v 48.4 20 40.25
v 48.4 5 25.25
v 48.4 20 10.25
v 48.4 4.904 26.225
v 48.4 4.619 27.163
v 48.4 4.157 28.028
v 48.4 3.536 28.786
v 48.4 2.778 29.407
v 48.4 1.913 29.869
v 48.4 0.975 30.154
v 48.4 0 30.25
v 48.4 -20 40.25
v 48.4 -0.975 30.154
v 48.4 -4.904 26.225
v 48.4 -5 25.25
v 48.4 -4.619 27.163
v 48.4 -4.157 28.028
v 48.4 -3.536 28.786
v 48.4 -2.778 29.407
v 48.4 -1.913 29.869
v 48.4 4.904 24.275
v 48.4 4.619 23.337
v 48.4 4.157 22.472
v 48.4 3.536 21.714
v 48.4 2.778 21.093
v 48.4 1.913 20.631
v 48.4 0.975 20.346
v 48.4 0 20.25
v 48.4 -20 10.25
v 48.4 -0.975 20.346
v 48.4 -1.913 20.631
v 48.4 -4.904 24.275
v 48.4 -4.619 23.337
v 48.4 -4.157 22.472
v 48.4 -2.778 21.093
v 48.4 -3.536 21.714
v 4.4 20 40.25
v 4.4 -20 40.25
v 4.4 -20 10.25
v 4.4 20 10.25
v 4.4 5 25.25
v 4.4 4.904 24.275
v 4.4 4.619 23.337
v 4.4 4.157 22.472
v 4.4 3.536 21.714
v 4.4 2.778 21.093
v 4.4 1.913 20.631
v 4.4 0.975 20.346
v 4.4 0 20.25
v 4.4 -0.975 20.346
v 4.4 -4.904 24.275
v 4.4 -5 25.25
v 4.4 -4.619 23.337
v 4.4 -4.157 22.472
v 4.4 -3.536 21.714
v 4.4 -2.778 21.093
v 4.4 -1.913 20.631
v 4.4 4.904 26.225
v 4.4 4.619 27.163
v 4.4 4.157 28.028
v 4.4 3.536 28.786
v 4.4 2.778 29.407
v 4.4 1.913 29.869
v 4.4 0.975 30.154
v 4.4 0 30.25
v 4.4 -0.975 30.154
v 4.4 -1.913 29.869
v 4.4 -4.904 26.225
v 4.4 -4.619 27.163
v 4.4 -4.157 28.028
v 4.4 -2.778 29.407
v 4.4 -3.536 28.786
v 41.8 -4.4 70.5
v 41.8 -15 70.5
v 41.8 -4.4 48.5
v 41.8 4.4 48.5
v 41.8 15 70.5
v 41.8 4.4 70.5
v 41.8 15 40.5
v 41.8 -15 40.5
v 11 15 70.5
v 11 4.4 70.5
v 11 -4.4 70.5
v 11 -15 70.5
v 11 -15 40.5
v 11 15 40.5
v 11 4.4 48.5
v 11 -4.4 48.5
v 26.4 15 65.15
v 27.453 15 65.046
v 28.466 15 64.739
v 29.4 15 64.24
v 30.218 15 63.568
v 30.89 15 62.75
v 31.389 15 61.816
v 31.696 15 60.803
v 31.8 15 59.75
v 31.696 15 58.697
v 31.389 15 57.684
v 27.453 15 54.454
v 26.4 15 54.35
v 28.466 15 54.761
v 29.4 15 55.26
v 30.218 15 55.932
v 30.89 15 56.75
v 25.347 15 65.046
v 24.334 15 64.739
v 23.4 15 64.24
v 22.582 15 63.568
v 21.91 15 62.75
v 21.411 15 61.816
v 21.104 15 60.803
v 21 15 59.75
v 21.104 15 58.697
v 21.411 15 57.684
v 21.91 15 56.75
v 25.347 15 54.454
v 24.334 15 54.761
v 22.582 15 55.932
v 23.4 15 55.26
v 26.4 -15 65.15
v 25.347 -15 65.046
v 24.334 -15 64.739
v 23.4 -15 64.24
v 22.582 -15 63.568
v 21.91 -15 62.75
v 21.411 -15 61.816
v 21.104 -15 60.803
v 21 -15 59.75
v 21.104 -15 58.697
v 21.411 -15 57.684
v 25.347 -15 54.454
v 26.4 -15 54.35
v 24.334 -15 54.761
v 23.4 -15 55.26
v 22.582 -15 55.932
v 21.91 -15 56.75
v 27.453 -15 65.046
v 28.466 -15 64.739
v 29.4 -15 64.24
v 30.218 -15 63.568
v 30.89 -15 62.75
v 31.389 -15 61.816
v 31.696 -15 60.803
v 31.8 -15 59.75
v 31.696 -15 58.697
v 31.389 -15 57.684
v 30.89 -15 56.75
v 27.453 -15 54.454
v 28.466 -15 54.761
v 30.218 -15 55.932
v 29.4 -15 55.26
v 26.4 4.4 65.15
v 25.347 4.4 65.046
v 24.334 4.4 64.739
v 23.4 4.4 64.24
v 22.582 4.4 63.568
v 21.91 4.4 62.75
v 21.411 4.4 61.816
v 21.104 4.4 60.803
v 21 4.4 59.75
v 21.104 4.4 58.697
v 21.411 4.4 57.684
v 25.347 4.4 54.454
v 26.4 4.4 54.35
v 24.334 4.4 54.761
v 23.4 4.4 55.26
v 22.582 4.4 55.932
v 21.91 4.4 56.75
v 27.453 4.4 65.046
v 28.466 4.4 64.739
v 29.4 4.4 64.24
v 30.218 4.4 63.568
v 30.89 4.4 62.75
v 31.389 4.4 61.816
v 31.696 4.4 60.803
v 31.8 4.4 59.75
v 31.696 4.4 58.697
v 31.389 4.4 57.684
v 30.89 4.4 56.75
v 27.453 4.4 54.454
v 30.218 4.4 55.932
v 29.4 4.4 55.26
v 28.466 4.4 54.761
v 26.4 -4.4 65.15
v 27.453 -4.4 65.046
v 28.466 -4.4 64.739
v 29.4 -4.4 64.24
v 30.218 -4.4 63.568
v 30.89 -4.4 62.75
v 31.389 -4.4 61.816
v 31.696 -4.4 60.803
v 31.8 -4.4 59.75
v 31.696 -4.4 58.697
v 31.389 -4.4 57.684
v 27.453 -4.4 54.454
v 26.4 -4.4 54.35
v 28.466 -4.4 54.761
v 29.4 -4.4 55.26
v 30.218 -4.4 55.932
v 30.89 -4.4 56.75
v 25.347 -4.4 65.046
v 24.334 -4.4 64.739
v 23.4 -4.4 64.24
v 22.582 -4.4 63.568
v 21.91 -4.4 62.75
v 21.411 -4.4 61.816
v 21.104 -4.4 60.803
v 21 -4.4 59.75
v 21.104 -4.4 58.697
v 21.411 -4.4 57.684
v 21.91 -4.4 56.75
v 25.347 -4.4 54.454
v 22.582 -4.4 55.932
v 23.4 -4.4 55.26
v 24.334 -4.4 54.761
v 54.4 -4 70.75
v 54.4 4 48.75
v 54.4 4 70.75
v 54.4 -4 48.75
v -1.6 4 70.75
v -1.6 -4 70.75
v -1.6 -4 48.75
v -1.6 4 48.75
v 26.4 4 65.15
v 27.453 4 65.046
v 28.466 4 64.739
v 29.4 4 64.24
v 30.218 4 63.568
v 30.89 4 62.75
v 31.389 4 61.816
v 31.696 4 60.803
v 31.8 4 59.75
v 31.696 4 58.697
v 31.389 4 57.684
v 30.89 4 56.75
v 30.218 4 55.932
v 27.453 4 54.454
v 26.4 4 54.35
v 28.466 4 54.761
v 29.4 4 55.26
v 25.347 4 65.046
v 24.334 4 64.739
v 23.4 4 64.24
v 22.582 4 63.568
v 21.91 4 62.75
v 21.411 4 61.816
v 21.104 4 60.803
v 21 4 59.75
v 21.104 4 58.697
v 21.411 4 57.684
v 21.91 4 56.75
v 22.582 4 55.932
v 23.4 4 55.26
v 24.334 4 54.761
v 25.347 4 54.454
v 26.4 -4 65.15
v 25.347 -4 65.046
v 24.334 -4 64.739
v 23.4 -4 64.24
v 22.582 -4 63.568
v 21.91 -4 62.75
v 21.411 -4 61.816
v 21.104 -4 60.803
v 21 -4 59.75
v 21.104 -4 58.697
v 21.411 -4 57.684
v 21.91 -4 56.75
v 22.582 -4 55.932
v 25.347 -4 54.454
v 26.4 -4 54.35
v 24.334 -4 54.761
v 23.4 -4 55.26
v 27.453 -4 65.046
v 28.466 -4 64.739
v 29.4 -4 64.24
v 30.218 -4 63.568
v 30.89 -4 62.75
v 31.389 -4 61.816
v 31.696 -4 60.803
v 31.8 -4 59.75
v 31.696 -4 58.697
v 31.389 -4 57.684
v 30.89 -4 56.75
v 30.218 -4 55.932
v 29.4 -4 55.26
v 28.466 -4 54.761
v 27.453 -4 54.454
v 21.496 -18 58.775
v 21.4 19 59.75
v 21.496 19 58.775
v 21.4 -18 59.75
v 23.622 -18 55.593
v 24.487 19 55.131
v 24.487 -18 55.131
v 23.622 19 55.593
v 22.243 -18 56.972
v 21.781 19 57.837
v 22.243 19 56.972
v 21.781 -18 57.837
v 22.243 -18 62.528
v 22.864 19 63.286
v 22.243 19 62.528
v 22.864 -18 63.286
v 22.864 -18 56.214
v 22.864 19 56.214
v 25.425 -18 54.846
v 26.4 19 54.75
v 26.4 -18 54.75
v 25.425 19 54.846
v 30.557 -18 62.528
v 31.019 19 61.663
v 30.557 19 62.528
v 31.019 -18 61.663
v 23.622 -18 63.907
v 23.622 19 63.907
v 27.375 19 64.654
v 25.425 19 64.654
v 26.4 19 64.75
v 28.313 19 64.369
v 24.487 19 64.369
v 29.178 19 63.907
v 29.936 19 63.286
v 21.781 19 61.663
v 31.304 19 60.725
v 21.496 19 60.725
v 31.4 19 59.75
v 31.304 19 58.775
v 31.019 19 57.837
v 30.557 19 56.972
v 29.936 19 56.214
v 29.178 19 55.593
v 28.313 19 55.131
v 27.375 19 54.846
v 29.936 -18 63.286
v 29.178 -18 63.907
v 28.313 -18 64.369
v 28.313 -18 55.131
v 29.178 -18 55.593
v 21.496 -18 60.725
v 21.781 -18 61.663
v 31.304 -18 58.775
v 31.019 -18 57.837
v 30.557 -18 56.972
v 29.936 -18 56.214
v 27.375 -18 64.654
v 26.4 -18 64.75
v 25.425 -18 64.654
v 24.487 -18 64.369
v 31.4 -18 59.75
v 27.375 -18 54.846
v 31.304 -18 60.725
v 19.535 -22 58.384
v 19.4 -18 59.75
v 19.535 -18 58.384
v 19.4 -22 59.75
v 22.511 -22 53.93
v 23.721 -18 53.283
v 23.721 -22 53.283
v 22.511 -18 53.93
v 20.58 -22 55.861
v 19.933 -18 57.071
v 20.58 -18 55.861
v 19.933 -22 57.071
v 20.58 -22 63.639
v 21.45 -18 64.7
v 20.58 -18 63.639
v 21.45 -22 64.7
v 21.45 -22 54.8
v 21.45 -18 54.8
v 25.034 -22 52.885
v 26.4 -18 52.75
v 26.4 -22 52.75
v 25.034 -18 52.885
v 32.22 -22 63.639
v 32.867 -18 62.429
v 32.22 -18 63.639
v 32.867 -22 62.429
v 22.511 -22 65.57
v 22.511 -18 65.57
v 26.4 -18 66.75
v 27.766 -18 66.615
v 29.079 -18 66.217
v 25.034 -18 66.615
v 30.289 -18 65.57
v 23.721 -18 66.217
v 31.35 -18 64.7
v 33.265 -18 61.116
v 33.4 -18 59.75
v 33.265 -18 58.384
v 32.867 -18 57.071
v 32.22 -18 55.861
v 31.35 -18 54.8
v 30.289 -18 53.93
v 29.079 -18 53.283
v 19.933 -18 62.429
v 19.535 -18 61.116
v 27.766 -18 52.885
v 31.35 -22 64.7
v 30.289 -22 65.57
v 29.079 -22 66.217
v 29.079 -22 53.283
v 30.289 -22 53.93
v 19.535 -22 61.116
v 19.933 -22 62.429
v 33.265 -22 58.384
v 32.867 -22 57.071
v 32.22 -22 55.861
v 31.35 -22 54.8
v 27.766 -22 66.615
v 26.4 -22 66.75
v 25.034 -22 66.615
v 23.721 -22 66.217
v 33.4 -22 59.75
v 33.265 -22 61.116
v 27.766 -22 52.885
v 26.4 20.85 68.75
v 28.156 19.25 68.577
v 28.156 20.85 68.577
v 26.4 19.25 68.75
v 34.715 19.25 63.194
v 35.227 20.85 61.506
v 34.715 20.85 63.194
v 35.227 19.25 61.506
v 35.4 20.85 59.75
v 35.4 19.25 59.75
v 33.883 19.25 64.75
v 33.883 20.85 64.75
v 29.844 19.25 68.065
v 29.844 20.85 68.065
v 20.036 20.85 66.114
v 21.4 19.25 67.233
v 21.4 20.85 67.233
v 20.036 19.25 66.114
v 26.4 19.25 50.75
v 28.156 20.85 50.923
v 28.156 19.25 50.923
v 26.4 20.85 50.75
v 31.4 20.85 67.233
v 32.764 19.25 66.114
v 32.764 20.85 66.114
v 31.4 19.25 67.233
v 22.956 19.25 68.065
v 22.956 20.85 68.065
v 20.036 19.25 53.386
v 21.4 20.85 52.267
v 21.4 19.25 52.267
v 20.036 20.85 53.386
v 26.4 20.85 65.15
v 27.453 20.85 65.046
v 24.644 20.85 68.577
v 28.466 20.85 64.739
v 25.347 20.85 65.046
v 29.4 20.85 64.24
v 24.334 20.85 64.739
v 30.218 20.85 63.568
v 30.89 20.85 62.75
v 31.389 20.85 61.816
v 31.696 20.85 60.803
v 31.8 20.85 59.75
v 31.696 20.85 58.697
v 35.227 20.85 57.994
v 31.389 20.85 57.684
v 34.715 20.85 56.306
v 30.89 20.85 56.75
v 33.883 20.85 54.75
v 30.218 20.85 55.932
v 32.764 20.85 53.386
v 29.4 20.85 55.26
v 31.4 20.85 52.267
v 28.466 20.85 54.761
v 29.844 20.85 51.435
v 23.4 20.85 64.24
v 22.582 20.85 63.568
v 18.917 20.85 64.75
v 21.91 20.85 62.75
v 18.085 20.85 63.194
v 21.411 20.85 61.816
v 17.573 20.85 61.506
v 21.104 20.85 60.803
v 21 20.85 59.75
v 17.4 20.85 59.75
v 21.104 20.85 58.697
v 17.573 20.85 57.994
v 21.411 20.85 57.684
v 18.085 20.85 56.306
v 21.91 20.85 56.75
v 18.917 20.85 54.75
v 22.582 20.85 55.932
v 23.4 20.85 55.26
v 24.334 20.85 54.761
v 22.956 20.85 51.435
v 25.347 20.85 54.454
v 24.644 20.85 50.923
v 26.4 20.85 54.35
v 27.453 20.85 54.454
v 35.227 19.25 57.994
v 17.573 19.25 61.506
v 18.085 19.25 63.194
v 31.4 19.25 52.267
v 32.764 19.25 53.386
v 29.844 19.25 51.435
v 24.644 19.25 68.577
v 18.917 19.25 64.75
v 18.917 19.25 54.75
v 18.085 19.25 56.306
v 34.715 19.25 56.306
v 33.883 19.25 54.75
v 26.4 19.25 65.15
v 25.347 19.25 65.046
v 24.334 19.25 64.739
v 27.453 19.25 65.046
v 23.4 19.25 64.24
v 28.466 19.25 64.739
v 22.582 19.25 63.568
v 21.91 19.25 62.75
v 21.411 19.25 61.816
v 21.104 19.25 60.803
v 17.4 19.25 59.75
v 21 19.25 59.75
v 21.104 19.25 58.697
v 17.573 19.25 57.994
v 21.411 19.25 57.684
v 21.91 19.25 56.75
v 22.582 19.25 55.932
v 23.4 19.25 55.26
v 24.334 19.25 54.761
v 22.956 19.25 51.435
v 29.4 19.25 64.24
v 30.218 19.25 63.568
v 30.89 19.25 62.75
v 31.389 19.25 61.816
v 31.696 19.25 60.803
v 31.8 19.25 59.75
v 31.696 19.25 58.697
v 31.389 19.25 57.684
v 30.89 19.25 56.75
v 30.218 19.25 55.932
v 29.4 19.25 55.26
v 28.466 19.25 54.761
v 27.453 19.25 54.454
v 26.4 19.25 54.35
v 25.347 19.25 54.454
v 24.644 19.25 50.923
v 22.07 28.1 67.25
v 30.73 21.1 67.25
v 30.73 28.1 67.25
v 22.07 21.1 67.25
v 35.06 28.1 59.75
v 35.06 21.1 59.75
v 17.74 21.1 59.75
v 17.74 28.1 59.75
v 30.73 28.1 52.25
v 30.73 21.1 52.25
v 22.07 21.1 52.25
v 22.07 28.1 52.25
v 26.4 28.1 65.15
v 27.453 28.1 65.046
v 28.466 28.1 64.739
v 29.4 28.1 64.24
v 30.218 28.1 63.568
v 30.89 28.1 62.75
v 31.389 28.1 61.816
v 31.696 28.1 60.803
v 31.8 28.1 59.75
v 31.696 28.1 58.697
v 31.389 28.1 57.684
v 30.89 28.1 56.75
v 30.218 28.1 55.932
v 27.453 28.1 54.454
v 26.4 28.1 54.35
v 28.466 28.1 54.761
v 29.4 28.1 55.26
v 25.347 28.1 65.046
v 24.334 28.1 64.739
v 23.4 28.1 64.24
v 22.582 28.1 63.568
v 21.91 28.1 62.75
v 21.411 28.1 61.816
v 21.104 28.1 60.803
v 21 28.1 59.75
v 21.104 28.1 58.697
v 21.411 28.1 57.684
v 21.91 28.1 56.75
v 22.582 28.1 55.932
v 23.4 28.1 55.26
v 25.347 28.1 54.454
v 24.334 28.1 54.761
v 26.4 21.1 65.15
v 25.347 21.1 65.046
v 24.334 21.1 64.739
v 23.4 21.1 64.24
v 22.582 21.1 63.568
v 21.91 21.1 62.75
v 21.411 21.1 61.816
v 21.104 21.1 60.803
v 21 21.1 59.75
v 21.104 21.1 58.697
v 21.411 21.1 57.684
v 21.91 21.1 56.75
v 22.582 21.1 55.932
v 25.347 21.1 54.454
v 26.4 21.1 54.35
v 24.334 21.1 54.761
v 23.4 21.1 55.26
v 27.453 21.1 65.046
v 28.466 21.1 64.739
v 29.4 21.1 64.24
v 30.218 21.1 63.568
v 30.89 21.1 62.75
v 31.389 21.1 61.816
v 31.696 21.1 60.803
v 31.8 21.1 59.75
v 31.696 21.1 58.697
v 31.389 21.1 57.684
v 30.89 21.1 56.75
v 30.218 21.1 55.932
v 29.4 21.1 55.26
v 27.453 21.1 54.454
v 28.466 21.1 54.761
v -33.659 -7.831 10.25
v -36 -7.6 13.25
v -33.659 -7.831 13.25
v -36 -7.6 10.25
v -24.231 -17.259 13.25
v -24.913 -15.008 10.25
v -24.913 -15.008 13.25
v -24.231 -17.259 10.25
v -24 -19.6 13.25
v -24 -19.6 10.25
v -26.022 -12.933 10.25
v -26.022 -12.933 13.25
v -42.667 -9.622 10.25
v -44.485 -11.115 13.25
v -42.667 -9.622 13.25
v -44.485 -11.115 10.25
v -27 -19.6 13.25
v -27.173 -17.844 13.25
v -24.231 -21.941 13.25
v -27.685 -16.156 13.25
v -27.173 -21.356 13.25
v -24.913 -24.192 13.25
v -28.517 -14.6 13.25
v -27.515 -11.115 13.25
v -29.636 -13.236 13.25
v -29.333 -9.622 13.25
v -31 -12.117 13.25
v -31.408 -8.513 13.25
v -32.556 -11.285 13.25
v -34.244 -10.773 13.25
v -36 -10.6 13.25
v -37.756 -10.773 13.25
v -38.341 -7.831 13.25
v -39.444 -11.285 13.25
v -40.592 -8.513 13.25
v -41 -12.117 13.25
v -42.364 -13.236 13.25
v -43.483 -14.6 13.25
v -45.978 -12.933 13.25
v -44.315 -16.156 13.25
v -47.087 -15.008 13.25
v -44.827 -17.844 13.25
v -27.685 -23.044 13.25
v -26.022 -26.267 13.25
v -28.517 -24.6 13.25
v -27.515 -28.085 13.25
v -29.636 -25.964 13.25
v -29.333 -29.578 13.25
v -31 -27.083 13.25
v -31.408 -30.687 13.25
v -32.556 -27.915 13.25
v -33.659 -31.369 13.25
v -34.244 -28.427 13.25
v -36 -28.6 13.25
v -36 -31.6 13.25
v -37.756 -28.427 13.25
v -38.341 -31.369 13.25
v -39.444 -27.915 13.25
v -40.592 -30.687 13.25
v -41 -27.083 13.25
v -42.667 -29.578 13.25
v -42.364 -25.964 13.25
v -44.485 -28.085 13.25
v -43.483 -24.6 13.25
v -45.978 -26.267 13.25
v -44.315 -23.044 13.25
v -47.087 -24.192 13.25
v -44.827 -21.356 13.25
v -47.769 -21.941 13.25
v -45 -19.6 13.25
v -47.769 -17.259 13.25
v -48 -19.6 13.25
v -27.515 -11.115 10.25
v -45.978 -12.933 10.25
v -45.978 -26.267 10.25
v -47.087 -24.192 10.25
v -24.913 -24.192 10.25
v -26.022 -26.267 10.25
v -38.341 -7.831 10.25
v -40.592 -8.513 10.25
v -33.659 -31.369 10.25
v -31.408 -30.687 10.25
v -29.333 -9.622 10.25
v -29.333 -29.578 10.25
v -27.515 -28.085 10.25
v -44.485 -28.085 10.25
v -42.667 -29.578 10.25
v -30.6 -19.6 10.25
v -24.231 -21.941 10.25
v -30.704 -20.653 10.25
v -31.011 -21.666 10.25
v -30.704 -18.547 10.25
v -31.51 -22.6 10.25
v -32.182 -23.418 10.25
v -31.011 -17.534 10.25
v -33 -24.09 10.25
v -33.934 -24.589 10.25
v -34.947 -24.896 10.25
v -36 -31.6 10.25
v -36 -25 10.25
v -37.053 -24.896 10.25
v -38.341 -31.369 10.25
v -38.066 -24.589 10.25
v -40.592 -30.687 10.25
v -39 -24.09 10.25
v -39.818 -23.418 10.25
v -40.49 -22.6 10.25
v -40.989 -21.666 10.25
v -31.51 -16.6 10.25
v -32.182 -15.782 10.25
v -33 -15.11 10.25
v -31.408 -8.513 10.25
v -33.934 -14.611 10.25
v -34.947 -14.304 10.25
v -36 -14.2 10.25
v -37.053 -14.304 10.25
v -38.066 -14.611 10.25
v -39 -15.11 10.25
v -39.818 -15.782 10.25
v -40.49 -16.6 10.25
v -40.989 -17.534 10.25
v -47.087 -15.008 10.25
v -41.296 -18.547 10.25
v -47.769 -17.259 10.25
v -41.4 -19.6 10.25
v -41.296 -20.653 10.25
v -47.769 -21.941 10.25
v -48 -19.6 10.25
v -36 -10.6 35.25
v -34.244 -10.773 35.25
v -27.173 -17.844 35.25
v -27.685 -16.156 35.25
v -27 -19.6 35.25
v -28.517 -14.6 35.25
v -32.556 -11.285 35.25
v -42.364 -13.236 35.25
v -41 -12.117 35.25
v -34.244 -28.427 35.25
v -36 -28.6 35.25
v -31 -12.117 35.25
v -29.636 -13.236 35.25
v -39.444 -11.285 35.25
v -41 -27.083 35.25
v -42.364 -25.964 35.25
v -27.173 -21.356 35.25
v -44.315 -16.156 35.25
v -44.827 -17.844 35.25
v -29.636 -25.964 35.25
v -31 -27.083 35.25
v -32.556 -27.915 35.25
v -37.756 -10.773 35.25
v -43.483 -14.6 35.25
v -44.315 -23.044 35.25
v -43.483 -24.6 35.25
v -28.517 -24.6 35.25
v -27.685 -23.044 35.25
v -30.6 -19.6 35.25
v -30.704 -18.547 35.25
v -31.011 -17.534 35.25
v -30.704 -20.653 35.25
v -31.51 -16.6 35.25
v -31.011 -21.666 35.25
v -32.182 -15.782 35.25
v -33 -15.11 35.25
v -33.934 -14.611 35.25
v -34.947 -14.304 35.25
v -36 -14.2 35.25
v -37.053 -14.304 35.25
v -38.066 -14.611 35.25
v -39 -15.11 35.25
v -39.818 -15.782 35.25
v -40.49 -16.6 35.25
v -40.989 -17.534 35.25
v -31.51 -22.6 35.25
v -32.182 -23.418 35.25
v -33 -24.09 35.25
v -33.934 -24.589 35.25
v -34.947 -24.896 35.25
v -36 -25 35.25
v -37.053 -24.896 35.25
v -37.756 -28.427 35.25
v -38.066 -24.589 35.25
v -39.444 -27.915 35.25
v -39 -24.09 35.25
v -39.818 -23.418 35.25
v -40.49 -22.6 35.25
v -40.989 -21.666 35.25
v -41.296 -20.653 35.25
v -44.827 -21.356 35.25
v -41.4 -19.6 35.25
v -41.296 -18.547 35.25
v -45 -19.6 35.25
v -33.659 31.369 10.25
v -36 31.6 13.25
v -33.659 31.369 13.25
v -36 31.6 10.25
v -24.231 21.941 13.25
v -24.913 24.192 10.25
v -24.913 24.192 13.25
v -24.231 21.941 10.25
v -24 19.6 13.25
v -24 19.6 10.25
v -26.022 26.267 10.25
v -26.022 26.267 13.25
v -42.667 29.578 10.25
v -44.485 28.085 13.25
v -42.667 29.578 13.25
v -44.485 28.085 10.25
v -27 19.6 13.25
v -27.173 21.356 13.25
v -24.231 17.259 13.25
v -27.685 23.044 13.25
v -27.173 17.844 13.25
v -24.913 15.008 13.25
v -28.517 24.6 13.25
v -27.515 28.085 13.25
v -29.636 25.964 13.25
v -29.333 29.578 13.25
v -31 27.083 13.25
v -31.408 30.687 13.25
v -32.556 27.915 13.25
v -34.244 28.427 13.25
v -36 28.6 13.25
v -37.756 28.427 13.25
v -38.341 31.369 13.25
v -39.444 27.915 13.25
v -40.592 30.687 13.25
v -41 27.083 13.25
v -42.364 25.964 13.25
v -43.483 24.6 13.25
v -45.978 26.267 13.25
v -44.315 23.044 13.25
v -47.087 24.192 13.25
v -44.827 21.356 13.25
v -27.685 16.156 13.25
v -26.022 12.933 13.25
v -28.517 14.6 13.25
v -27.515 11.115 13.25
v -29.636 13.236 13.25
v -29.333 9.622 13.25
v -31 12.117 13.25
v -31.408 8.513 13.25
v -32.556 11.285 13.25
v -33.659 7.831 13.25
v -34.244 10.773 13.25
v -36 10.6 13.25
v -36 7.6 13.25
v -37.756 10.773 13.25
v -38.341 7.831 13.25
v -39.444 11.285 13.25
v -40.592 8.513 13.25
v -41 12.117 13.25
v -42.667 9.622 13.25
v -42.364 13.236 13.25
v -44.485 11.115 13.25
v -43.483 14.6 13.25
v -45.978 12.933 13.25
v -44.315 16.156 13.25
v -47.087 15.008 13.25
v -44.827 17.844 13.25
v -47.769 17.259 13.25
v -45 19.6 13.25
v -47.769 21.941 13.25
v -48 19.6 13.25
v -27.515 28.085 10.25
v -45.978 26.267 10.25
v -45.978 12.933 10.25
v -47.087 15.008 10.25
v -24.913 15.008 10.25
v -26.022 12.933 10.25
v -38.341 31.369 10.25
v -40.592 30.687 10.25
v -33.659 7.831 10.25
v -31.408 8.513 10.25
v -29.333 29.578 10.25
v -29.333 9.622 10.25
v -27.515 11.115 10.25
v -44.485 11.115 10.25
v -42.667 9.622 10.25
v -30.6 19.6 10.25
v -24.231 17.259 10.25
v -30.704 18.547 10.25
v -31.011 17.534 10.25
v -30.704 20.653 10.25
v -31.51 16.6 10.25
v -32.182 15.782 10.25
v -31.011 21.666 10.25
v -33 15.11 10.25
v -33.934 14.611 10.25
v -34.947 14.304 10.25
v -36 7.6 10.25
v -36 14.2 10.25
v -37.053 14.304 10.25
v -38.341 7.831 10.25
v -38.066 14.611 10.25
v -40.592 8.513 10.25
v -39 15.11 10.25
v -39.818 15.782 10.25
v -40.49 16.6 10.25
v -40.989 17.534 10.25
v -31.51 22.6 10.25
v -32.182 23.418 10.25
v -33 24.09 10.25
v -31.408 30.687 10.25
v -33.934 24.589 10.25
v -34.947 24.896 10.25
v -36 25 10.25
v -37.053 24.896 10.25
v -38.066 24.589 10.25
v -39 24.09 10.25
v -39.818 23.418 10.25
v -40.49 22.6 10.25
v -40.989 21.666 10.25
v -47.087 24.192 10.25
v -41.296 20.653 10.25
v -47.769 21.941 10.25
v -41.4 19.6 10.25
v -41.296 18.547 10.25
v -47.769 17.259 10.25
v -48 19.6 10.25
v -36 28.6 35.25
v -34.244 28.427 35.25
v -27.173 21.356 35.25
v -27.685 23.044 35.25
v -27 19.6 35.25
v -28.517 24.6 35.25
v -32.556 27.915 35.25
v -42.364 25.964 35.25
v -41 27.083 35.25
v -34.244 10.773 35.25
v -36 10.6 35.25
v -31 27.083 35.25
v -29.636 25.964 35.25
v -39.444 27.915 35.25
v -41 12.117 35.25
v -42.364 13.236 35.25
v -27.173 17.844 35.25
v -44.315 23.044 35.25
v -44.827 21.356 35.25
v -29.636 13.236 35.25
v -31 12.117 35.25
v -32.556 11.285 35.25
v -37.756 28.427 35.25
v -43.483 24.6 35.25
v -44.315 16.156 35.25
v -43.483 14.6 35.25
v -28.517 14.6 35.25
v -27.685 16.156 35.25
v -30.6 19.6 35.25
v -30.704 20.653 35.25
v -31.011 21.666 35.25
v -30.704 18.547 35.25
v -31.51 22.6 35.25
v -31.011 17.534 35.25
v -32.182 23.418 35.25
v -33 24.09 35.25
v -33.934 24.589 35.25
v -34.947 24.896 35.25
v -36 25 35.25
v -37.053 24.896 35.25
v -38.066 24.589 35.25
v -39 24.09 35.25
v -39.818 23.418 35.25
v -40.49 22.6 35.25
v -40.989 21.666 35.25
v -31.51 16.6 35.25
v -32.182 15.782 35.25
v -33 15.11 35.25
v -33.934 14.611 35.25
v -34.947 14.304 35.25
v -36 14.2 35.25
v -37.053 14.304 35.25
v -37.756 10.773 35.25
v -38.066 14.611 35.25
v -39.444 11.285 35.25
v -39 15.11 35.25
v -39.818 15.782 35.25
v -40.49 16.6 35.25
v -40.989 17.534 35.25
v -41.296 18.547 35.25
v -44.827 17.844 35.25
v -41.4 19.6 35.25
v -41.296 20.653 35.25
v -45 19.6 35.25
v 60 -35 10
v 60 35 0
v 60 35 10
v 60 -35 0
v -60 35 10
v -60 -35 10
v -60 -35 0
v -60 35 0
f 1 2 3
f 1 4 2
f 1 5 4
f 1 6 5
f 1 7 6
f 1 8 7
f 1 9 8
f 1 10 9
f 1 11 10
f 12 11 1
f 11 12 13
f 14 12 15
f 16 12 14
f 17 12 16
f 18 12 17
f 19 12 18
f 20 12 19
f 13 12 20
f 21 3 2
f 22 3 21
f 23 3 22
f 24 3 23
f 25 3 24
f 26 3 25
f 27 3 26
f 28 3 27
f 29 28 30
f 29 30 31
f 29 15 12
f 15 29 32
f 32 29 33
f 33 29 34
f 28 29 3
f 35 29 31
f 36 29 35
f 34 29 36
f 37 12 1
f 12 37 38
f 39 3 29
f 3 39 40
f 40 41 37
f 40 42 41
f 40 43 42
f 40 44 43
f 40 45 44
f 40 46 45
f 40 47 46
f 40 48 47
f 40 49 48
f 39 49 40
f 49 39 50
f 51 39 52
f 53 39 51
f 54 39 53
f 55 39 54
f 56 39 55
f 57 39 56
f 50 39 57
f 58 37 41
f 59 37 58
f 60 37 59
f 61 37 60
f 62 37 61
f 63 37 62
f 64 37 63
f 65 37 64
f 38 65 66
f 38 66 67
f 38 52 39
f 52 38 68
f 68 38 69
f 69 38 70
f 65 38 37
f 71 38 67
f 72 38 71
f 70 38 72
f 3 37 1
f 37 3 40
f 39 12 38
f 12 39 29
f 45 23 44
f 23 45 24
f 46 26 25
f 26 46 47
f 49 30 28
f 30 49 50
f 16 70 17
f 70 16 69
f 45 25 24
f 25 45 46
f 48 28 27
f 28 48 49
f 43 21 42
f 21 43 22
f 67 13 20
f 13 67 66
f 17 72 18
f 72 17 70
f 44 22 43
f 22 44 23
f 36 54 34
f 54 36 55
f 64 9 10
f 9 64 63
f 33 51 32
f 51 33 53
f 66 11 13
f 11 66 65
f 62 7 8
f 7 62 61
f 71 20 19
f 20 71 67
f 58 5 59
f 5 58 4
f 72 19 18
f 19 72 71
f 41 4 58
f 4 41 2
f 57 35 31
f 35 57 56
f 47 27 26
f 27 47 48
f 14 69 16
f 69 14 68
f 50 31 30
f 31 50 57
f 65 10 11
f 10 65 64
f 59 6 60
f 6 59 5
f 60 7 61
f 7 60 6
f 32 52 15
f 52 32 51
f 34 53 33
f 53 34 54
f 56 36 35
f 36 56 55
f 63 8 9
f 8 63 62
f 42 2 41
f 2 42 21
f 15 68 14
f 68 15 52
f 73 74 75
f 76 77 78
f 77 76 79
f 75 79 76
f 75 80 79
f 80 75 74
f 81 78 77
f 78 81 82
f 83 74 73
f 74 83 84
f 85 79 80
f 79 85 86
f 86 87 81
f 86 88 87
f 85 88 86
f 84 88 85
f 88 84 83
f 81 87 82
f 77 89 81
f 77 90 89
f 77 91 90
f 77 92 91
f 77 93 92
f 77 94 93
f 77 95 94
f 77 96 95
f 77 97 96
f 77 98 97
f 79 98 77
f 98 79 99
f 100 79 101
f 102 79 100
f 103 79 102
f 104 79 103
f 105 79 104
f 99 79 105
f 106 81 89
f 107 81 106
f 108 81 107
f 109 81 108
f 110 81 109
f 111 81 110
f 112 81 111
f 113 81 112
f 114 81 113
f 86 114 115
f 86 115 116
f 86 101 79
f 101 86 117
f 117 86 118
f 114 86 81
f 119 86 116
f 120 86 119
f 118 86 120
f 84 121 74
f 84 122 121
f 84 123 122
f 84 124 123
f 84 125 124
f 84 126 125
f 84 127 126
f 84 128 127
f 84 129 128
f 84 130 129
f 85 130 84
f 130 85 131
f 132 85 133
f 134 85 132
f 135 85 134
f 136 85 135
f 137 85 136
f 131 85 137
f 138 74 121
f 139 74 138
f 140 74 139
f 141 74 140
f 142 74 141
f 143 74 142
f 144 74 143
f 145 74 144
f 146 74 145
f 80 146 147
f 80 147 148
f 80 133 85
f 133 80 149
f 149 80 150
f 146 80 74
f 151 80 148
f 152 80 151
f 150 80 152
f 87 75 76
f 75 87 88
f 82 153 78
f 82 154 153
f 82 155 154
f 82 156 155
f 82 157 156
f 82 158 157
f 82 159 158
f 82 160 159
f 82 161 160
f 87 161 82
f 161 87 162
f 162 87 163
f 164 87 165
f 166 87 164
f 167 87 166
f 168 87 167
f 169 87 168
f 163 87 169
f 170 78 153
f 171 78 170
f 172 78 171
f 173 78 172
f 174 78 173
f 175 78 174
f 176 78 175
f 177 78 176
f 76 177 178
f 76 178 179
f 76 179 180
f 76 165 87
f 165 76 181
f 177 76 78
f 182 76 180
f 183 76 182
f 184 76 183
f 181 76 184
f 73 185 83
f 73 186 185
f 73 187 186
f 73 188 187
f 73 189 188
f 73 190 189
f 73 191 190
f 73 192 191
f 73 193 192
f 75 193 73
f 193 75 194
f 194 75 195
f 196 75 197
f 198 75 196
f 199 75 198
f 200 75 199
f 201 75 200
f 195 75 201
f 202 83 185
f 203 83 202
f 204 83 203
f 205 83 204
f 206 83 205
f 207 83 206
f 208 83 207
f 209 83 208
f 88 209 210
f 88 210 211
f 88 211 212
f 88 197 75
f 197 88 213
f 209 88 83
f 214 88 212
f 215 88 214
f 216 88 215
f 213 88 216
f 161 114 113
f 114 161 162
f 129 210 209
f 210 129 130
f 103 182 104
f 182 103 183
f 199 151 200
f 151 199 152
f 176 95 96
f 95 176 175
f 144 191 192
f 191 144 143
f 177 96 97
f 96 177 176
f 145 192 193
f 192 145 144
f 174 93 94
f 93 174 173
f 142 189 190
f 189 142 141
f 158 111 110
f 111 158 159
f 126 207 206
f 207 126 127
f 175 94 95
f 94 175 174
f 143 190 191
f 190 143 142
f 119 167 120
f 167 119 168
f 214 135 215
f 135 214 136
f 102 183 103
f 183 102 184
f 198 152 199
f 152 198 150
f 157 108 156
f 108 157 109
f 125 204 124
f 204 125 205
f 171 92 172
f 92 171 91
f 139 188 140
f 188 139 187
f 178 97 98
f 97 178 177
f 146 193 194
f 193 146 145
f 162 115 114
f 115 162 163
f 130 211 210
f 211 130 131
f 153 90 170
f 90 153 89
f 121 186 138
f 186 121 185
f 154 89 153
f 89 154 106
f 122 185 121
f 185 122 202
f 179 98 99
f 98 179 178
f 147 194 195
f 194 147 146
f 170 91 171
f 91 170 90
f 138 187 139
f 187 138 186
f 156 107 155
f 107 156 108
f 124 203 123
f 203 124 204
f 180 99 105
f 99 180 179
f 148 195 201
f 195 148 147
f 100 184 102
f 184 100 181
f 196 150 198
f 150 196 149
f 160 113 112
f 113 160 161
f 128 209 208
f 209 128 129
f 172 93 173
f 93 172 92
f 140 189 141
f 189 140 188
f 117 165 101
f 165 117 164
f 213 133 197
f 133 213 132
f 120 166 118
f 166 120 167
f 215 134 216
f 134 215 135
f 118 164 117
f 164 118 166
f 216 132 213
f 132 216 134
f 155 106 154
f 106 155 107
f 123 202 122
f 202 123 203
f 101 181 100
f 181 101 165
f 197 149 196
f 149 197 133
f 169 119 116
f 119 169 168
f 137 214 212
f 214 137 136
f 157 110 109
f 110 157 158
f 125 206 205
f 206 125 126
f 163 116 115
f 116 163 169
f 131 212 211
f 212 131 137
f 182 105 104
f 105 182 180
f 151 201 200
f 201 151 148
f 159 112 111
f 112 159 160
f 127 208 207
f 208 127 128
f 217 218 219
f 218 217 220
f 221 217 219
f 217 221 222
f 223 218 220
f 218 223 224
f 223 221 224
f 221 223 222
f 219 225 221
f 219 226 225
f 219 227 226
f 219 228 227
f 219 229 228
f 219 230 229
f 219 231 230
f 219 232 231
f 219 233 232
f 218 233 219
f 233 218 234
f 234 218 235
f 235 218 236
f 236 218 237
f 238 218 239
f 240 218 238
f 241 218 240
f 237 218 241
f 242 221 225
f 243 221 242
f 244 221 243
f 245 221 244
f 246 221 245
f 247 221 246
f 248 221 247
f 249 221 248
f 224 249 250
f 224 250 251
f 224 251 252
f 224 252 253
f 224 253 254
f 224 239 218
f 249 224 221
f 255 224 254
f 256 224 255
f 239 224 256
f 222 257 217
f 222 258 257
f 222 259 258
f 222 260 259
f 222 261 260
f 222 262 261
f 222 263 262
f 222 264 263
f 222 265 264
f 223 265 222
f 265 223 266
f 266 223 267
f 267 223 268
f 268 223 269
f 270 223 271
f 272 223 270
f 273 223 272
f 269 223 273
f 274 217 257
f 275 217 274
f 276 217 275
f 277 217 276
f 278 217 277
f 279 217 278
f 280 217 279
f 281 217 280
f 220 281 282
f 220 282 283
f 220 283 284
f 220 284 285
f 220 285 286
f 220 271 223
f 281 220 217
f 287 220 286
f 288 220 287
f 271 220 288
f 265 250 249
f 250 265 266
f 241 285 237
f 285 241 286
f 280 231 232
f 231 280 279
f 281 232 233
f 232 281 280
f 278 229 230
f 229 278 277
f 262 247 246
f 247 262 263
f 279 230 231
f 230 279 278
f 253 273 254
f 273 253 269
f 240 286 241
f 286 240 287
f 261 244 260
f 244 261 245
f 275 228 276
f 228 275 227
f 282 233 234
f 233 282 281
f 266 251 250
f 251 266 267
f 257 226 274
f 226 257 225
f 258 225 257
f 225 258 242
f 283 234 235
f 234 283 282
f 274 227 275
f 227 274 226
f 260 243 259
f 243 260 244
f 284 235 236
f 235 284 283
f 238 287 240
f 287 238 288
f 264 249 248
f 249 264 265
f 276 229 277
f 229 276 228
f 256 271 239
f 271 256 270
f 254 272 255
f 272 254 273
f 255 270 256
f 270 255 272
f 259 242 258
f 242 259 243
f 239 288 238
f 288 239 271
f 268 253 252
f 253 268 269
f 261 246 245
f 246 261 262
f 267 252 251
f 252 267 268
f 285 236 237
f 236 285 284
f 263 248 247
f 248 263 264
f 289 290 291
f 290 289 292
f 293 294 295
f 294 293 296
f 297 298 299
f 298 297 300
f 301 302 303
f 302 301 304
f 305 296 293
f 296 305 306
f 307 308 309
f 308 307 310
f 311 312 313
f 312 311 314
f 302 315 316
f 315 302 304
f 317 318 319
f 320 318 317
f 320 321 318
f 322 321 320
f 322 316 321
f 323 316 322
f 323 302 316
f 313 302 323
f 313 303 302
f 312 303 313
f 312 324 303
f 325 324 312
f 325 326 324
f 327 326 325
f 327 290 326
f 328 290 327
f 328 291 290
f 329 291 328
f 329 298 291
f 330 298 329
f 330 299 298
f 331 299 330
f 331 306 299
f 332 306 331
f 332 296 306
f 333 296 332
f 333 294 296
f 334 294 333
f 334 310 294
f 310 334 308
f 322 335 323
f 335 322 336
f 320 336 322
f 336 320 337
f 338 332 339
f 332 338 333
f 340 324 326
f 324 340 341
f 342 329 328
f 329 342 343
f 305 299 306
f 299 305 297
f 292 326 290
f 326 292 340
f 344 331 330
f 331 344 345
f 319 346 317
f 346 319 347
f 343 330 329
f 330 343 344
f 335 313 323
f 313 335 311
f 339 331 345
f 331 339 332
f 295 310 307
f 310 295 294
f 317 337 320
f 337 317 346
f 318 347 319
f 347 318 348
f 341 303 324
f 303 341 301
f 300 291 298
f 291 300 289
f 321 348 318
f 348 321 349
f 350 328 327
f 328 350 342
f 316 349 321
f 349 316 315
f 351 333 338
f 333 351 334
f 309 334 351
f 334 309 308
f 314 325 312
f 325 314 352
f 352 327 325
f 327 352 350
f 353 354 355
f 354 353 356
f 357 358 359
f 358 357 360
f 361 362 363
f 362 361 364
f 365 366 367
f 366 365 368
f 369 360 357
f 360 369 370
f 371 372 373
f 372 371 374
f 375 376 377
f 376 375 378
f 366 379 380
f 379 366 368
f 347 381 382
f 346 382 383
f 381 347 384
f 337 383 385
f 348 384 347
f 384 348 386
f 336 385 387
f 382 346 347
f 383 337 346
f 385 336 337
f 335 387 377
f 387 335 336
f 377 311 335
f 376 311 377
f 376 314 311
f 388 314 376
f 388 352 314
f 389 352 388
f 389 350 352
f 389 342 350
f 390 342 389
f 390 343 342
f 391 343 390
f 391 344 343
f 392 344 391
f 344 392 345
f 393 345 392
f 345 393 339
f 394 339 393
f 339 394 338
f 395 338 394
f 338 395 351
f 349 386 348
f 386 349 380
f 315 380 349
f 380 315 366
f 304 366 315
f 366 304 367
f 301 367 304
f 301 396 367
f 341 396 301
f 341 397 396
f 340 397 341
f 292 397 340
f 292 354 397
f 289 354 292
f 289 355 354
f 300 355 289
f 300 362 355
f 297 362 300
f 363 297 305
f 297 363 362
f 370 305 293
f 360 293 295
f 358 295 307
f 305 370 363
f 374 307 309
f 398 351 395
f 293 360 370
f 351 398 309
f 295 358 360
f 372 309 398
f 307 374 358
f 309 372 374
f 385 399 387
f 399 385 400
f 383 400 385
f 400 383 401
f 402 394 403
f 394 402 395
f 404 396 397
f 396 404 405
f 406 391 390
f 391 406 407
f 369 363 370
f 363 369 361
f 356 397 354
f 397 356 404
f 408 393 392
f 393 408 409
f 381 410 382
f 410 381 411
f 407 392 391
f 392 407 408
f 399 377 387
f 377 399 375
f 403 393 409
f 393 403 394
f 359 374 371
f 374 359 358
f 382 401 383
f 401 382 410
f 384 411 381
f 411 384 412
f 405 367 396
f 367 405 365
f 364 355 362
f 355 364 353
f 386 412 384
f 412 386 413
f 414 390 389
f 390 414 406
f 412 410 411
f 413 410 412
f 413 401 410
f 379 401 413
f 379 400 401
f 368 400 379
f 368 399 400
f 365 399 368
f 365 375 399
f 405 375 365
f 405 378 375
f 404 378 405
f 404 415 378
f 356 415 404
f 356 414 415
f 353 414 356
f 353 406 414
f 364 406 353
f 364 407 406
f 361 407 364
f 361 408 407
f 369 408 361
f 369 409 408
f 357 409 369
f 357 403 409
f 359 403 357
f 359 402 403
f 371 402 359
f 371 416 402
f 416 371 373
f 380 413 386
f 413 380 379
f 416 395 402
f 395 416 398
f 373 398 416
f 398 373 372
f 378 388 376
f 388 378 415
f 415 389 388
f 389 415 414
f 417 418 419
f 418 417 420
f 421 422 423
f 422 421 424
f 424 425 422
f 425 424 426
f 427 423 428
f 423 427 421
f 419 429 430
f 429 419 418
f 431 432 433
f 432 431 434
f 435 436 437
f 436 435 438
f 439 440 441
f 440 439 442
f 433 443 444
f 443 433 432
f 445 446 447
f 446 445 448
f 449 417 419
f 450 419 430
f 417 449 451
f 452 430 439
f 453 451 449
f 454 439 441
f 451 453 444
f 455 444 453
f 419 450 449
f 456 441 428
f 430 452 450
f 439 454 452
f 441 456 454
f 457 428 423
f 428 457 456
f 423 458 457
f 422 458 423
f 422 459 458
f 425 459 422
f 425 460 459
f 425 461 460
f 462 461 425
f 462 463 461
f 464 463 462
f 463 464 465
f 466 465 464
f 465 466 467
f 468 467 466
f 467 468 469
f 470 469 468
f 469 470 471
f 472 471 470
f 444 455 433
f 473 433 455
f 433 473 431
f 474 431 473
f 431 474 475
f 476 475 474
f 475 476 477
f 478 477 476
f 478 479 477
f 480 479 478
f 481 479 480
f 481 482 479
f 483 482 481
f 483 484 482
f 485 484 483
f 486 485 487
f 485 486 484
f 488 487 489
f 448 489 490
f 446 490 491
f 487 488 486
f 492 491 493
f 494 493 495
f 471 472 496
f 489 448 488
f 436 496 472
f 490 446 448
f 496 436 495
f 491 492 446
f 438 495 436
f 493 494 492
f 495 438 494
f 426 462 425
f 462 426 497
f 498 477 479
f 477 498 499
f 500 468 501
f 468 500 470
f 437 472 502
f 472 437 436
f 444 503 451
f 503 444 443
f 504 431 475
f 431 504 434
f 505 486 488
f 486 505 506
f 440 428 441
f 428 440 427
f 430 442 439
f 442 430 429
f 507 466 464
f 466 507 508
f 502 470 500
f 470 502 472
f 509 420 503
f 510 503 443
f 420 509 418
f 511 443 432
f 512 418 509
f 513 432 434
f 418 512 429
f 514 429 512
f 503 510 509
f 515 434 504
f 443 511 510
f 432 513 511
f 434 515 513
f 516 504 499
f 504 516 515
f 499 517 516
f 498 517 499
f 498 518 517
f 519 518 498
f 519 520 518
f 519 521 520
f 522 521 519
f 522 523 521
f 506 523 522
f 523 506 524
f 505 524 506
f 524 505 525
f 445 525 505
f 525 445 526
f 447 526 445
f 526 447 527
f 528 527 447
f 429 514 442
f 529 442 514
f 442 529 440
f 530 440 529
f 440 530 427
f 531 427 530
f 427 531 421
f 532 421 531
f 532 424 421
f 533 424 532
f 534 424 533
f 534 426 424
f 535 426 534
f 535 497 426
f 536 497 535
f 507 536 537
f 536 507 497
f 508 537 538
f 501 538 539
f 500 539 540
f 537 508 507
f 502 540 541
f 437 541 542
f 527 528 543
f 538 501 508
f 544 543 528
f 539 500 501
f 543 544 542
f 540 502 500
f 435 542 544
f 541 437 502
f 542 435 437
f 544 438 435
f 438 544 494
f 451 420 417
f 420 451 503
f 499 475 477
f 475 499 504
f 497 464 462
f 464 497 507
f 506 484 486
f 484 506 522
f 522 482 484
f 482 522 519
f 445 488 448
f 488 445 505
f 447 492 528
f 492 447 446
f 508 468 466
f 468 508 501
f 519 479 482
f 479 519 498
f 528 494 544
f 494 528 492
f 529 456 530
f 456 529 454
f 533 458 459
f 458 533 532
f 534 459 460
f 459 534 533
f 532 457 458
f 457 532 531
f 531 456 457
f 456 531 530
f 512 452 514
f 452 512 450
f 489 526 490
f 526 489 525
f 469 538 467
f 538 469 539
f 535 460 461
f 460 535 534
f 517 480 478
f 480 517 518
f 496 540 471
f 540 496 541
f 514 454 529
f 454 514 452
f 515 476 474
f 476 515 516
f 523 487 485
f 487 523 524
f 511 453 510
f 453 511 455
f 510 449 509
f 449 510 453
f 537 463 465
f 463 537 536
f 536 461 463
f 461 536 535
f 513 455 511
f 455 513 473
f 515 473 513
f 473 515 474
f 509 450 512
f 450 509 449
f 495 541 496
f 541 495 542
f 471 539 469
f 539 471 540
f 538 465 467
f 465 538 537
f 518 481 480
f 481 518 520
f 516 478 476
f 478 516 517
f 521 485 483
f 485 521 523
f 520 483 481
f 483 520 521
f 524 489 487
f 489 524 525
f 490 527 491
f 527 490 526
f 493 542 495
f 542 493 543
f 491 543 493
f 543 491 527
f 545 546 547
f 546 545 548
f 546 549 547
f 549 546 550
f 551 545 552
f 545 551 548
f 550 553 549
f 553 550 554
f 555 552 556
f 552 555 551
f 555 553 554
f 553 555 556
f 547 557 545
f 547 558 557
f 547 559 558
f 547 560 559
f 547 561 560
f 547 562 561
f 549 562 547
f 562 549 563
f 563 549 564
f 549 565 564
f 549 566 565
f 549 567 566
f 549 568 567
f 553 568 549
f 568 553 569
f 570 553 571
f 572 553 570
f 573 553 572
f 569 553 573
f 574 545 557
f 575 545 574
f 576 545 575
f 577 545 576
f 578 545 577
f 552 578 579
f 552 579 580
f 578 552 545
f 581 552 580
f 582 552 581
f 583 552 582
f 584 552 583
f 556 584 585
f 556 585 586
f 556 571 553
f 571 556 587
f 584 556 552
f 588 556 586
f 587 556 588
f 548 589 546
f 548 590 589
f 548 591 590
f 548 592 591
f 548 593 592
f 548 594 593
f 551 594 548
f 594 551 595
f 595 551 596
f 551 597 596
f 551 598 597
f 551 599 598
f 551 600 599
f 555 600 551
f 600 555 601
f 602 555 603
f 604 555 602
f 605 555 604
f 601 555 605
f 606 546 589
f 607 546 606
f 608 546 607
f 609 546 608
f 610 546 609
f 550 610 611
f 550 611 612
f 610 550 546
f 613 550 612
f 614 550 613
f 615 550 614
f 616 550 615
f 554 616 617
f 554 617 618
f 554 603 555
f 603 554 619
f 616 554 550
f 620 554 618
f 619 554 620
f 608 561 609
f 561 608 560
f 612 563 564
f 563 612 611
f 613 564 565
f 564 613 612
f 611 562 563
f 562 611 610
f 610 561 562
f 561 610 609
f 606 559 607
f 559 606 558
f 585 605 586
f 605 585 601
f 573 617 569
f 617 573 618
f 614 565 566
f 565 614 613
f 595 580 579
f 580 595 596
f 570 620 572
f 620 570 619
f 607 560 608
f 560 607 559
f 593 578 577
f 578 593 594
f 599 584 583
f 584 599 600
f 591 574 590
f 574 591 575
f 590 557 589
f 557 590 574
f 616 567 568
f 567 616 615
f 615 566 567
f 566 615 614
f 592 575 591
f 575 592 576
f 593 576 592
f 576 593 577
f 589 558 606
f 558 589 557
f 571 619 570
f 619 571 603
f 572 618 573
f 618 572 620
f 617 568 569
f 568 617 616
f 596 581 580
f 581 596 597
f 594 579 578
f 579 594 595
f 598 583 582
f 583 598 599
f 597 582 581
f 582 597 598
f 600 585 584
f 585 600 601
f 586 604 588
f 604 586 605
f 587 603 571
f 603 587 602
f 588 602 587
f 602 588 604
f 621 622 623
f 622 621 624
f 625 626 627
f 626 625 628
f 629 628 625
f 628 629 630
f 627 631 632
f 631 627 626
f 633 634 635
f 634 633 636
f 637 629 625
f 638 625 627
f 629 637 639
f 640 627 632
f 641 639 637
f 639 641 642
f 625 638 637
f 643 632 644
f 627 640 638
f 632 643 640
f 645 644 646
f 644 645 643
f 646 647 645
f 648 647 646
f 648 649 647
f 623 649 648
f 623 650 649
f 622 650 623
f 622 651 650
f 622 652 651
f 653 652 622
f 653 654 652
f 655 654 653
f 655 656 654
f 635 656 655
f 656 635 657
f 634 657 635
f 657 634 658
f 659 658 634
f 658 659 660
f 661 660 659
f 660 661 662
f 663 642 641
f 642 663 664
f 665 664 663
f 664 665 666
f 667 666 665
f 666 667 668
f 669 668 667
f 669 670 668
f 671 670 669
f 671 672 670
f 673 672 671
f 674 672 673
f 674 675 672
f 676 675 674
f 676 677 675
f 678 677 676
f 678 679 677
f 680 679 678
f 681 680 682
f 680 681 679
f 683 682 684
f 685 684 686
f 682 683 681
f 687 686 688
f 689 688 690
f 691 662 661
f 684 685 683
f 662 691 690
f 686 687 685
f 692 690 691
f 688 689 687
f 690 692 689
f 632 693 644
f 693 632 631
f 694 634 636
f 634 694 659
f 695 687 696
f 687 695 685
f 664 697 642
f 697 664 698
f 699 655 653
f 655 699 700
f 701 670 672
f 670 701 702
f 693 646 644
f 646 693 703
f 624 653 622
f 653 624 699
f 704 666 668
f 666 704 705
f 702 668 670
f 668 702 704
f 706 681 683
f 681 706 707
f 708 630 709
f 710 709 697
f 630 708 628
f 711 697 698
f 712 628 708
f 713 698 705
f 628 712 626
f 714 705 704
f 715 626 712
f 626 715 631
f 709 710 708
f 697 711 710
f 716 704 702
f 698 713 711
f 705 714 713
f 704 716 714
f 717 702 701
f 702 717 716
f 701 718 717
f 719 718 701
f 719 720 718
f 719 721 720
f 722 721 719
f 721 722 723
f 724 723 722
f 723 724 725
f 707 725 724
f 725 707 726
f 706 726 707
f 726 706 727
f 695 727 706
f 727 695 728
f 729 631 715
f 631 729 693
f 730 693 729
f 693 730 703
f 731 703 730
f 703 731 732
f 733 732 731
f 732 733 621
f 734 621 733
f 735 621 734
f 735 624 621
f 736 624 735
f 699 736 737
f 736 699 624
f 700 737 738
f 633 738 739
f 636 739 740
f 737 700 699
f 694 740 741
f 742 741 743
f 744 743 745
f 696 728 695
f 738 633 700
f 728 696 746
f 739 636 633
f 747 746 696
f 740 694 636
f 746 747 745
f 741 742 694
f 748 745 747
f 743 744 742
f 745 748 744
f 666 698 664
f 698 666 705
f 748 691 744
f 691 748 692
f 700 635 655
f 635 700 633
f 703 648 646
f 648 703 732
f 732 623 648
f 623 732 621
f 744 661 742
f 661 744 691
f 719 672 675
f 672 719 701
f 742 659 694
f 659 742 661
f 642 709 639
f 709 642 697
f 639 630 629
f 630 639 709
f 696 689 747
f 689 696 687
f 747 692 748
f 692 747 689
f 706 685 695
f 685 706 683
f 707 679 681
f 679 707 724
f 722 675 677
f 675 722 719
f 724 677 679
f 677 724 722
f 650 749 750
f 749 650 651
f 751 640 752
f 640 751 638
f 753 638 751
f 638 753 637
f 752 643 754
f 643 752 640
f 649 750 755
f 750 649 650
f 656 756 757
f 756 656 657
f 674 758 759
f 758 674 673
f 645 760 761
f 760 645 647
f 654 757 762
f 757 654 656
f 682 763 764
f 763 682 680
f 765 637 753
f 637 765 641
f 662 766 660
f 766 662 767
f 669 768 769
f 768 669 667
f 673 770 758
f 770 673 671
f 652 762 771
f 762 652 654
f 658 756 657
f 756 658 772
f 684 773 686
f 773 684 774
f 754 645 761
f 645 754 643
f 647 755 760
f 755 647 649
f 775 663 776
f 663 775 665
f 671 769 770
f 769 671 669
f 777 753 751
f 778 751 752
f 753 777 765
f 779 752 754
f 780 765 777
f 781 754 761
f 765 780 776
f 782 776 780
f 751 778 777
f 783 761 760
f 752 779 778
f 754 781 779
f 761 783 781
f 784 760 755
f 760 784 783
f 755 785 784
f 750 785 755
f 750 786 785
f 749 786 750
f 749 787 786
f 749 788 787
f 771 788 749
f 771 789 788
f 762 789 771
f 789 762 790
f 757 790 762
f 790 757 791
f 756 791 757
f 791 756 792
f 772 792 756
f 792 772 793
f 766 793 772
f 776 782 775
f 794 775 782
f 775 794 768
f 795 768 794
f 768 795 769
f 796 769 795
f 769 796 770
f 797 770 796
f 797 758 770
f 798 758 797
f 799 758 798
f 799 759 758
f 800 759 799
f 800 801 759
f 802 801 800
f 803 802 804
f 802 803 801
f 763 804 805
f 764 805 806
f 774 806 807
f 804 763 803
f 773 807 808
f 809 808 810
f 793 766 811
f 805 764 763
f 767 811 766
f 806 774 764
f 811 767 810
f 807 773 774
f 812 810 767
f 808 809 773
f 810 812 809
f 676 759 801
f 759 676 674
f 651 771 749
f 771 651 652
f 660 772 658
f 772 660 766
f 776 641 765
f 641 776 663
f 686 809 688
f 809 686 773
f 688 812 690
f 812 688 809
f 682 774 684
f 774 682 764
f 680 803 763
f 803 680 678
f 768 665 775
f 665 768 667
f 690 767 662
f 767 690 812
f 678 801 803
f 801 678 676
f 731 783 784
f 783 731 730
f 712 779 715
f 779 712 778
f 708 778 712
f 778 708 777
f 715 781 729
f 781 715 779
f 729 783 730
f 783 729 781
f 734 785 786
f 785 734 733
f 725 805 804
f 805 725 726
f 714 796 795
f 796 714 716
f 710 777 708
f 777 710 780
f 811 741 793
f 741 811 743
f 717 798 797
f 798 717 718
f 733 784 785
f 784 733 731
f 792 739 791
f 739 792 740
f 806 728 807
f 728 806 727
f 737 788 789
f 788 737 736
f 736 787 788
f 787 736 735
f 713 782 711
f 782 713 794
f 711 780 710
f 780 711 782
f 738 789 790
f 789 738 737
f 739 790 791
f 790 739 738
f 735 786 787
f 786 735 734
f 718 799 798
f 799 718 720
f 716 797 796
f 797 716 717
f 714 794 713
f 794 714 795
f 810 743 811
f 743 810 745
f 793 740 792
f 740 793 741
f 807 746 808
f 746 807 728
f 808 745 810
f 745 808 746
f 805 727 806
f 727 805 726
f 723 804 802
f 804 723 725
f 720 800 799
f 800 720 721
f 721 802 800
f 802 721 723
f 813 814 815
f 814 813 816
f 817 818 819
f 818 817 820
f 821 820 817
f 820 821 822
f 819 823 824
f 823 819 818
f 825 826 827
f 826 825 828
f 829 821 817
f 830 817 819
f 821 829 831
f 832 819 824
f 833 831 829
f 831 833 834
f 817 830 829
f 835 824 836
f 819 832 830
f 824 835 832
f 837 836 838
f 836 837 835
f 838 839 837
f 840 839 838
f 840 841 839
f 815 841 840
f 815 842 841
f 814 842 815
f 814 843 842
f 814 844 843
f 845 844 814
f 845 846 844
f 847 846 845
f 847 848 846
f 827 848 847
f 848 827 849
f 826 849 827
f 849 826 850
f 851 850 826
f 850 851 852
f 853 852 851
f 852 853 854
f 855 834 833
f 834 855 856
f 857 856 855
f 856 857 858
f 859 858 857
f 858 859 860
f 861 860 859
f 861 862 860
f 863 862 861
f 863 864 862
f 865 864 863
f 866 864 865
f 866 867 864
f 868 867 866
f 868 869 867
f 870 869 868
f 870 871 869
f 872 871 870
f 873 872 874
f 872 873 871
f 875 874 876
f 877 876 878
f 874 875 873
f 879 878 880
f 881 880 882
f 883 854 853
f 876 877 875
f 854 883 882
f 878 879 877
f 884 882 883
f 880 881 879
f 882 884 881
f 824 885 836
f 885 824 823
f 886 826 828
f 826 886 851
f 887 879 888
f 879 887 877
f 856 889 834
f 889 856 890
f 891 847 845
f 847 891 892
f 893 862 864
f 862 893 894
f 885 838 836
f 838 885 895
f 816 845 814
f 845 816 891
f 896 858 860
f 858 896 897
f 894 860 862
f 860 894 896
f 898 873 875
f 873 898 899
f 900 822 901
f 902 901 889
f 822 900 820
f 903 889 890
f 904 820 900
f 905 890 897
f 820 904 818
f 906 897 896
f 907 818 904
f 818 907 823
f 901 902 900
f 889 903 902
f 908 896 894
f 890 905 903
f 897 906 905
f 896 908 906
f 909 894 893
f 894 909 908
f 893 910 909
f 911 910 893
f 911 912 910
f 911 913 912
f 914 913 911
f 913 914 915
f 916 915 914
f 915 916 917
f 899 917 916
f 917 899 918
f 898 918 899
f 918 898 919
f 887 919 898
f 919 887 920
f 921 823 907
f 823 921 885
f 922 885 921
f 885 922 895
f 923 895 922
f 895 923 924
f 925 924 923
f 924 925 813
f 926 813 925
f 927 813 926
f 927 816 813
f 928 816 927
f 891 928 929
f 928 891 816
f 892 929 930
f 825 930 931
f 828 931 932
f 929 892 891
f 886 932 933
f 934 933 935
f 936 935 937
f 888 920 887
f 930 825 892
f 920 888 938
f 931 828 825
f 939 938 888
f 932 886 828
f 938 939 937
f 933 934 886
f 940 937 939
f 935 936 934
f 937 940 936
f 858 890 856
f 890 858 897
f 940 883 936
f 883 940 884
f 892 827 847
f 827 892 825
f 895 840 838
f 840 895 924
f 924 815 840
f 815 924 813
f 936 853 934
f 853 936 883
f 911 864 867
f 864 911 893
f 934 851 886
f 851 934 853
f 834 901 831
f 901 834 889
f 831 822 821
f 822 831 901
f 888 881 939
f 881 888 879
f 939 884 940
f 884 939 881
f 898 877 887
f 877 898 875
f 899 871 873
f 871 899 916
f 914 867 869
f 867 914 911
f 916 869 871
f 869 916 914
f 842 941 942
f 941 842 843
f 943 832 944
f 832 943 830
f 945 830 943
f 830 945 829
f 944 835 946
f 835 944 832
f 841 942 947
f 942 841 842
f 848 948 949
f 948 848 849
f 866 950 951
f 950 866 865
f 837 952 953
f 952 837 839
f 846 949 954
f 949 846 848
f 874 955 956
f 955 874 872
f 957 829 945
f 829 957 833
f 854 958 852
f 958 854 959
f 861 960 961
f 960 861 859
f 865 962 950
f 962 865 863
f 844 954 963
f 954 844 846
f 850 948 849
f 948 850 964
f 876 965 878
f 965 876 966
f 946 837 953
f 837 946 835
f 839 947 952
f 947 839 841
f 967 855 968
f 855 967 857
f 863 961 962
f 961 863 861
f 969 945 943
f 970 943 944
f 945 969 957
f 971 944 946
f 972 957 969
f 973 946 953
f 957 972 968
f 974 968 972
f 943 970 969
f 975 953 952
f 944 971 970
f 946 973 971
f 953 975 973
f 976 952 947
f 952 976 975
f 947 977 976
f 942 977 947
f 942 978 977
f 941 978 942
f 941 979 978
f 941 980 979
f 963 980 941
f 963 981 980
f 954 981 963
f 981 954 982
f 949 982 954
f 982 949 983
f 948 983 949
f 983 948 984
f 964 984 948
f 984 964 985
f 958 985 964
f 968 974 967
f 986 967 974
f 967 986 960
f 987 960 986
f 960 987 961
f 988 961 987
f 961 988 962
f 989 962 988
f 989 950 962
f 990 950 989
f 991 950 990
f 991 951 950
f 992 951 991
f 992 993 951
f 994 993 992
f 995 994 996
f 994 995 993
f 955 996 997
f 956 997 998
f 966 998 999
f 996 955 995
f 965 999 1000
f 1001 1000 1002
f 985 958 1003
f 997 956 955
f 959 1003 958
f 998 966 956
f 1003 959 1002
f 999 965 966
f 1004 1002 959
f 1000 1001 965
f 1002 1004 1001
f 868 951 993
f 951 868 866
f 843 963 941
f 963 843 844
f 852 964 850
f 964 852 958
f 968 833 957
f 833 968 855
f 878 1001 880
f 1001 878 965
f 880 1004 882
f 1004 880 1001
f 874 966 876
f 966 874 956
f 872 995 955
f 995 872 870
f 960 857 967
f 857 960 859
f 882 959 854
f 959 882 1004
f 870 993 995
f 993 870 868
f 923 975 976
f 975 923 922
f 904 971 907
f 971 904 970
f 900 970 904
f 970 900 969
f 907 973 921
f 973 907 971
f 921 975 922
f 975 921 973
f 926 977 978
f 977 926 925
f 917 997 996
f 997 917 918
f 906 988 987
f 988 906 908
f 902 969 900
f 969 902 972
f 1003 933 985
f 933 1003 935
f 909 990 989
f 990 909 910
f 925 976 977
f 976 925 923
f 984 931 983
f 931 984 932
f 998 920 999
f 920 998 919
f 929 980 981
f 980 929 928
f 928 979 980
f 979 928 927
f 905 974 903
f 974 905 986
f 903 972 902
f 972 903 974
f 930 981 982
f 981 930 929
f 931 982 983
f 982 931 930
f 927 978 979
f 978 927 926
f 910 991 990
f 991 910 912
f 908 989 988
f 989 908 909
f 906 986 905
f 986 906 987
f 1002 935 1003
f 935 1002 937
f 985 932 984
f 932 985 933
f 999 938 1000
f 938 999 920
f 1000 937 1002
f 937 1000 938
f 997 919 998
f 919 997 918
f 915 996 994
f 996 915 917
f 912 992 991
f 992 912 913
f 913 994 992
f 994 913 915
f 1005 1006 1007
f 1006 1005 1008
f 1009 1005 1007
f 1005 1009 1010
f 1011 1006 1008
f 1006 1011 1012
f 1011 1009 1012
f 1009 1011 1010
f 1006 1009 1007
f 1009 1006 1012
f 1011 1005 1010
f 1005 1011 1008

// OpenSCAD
$fn = 32;

// ------------------------------------------------------------------------
// Indexing jig: plate 120 x 70 mm, pin d10
// Every part is its own module, assembly() places every instance.
// ------------------------------------------------------------------------

// --- part 1 ---
module jig_plate() {
  difference() {
    translate([-60, -35, 0]) cube([120, 70, 10]);
  }
}

// --- part 2 ---
module locator_block() {
  difference() {
    translate([-22, -20, 0]) cube([44, 40, 30]);
    translate([0, 0, 15]) rotate([0, 90, 0]) cylinder(h = 46, d = 10, center = true);
  }
}

// --- part 3 ---
module index_fork() {
  difference() {
    translate([-15.4, -15, 0]) cube([30.8, 30, 30]);
    translate([-16.4, -4.4, 8]) cube([32.8, 8.8, 23]);
    translate([0, 0, 19.25]) rotate([90, 0, 0]) cylinder(h = 32, d = 10.8, center = true);
  }
}

// --- part 4 ---
module index_arm() {
  difference() {
    translate([-28, -4, 0]) cube([56, 8, 22]);
    translate([0, 0, 11]) rotate([90, 0, 0]) cylinder(h = 10, d = 10.8, center = true);
  }
}

// --- part 5 ---
module index_pin() {
  rotate([0, 90, 0]) cylinder(h = 38, d = 10, center = true);
  translate([-22, 0, 0]) rotate([0, 90, 0]) cylinder(h = 4, d = 14);
}

// --- part 6 ---
module pin_washer() {
  difference() {
      translate([0, 0, 0]) cylinder(h = 1.6, d = 18);
      translate([0, 0, -1]) cylinder(h = 3.6, d = 10.8);
    }
}

// --- part 7 ---
module lock_nut() {
  difference() {
    linear_extrude(height = 7) polygon(points = [[8.66, 0], [4.33, 7.5], [-4.33, 7.5], [-8.66, 0], [-4.33, -7.5], [4.33, -7.5]]);
    translate([0, 0, -1]) cylinder(h = 9, d = 10.8);
  }
}

// --- part 8 ---
module guide_bush_a() {
  difference() {
    union() {
      cylinder(h = 3, d = 24);
      translate([0, 0, 3]) cylinder(h = 22, d = 18);
    }
    translate([0, 0, -1]) cylinder(h = 27, d = 10.8);
  }
}

// --- part 9 ---
module guide_bush_b() {
  difference() {
    union() {
      cylinder(h = 3, d = 24);
      translate([0, 0, 3]) cylinder(h = 22, d = 18);
    }
    translate([0, 0, -1]) cylinder(h = 27, d = 10.8);
  }
}

// --- assembly ---
module assembly() {
  color([0.80, 0.24, 0.20]) translate([0, 0, 0]) rotate([0, 0, 0]) jig_plate();
  color([0.20, 0.45, 0.75]) translate([26.4, 0, 10.25]) rotate([0, 0, 0]) locator_block();
  color([0.25, 0.62, 0.32]) translate([26.4, 0, 40.5]) rotate([0, 0, 0]) index_fork();
  color([0.92, 0.70, 0.18]) translate([26.4, 0, 48.75]) rotate([0, 0, 0]) index_arm();
  color([0.58, 0.35, 0.70]) translate([26.4, 0, 59.75]) rotate([0, 0, 90]) index_pin();
  color([0.16, 0.66, 0.66]) translate([26.4, 20.85, 59.75]) rotate([90, 0, 0]) pin_washer();
  color([0.85, 0.48, 0.18]) translate([26.4, 28.1, 59.75]) rotate([90, 0, 0]) lock_nut();
  color([0.55, 0.60, 0.65]) translate([-36, -19.6, 10.25]) rotate([0, 0, 0]) guide_bush_a();
  color([0.75, 0.30, 0.55]) translate([-36, 19.6, 10.25]) rotate([0, 0, 0]) guide_bush_b();
}

assembly();
